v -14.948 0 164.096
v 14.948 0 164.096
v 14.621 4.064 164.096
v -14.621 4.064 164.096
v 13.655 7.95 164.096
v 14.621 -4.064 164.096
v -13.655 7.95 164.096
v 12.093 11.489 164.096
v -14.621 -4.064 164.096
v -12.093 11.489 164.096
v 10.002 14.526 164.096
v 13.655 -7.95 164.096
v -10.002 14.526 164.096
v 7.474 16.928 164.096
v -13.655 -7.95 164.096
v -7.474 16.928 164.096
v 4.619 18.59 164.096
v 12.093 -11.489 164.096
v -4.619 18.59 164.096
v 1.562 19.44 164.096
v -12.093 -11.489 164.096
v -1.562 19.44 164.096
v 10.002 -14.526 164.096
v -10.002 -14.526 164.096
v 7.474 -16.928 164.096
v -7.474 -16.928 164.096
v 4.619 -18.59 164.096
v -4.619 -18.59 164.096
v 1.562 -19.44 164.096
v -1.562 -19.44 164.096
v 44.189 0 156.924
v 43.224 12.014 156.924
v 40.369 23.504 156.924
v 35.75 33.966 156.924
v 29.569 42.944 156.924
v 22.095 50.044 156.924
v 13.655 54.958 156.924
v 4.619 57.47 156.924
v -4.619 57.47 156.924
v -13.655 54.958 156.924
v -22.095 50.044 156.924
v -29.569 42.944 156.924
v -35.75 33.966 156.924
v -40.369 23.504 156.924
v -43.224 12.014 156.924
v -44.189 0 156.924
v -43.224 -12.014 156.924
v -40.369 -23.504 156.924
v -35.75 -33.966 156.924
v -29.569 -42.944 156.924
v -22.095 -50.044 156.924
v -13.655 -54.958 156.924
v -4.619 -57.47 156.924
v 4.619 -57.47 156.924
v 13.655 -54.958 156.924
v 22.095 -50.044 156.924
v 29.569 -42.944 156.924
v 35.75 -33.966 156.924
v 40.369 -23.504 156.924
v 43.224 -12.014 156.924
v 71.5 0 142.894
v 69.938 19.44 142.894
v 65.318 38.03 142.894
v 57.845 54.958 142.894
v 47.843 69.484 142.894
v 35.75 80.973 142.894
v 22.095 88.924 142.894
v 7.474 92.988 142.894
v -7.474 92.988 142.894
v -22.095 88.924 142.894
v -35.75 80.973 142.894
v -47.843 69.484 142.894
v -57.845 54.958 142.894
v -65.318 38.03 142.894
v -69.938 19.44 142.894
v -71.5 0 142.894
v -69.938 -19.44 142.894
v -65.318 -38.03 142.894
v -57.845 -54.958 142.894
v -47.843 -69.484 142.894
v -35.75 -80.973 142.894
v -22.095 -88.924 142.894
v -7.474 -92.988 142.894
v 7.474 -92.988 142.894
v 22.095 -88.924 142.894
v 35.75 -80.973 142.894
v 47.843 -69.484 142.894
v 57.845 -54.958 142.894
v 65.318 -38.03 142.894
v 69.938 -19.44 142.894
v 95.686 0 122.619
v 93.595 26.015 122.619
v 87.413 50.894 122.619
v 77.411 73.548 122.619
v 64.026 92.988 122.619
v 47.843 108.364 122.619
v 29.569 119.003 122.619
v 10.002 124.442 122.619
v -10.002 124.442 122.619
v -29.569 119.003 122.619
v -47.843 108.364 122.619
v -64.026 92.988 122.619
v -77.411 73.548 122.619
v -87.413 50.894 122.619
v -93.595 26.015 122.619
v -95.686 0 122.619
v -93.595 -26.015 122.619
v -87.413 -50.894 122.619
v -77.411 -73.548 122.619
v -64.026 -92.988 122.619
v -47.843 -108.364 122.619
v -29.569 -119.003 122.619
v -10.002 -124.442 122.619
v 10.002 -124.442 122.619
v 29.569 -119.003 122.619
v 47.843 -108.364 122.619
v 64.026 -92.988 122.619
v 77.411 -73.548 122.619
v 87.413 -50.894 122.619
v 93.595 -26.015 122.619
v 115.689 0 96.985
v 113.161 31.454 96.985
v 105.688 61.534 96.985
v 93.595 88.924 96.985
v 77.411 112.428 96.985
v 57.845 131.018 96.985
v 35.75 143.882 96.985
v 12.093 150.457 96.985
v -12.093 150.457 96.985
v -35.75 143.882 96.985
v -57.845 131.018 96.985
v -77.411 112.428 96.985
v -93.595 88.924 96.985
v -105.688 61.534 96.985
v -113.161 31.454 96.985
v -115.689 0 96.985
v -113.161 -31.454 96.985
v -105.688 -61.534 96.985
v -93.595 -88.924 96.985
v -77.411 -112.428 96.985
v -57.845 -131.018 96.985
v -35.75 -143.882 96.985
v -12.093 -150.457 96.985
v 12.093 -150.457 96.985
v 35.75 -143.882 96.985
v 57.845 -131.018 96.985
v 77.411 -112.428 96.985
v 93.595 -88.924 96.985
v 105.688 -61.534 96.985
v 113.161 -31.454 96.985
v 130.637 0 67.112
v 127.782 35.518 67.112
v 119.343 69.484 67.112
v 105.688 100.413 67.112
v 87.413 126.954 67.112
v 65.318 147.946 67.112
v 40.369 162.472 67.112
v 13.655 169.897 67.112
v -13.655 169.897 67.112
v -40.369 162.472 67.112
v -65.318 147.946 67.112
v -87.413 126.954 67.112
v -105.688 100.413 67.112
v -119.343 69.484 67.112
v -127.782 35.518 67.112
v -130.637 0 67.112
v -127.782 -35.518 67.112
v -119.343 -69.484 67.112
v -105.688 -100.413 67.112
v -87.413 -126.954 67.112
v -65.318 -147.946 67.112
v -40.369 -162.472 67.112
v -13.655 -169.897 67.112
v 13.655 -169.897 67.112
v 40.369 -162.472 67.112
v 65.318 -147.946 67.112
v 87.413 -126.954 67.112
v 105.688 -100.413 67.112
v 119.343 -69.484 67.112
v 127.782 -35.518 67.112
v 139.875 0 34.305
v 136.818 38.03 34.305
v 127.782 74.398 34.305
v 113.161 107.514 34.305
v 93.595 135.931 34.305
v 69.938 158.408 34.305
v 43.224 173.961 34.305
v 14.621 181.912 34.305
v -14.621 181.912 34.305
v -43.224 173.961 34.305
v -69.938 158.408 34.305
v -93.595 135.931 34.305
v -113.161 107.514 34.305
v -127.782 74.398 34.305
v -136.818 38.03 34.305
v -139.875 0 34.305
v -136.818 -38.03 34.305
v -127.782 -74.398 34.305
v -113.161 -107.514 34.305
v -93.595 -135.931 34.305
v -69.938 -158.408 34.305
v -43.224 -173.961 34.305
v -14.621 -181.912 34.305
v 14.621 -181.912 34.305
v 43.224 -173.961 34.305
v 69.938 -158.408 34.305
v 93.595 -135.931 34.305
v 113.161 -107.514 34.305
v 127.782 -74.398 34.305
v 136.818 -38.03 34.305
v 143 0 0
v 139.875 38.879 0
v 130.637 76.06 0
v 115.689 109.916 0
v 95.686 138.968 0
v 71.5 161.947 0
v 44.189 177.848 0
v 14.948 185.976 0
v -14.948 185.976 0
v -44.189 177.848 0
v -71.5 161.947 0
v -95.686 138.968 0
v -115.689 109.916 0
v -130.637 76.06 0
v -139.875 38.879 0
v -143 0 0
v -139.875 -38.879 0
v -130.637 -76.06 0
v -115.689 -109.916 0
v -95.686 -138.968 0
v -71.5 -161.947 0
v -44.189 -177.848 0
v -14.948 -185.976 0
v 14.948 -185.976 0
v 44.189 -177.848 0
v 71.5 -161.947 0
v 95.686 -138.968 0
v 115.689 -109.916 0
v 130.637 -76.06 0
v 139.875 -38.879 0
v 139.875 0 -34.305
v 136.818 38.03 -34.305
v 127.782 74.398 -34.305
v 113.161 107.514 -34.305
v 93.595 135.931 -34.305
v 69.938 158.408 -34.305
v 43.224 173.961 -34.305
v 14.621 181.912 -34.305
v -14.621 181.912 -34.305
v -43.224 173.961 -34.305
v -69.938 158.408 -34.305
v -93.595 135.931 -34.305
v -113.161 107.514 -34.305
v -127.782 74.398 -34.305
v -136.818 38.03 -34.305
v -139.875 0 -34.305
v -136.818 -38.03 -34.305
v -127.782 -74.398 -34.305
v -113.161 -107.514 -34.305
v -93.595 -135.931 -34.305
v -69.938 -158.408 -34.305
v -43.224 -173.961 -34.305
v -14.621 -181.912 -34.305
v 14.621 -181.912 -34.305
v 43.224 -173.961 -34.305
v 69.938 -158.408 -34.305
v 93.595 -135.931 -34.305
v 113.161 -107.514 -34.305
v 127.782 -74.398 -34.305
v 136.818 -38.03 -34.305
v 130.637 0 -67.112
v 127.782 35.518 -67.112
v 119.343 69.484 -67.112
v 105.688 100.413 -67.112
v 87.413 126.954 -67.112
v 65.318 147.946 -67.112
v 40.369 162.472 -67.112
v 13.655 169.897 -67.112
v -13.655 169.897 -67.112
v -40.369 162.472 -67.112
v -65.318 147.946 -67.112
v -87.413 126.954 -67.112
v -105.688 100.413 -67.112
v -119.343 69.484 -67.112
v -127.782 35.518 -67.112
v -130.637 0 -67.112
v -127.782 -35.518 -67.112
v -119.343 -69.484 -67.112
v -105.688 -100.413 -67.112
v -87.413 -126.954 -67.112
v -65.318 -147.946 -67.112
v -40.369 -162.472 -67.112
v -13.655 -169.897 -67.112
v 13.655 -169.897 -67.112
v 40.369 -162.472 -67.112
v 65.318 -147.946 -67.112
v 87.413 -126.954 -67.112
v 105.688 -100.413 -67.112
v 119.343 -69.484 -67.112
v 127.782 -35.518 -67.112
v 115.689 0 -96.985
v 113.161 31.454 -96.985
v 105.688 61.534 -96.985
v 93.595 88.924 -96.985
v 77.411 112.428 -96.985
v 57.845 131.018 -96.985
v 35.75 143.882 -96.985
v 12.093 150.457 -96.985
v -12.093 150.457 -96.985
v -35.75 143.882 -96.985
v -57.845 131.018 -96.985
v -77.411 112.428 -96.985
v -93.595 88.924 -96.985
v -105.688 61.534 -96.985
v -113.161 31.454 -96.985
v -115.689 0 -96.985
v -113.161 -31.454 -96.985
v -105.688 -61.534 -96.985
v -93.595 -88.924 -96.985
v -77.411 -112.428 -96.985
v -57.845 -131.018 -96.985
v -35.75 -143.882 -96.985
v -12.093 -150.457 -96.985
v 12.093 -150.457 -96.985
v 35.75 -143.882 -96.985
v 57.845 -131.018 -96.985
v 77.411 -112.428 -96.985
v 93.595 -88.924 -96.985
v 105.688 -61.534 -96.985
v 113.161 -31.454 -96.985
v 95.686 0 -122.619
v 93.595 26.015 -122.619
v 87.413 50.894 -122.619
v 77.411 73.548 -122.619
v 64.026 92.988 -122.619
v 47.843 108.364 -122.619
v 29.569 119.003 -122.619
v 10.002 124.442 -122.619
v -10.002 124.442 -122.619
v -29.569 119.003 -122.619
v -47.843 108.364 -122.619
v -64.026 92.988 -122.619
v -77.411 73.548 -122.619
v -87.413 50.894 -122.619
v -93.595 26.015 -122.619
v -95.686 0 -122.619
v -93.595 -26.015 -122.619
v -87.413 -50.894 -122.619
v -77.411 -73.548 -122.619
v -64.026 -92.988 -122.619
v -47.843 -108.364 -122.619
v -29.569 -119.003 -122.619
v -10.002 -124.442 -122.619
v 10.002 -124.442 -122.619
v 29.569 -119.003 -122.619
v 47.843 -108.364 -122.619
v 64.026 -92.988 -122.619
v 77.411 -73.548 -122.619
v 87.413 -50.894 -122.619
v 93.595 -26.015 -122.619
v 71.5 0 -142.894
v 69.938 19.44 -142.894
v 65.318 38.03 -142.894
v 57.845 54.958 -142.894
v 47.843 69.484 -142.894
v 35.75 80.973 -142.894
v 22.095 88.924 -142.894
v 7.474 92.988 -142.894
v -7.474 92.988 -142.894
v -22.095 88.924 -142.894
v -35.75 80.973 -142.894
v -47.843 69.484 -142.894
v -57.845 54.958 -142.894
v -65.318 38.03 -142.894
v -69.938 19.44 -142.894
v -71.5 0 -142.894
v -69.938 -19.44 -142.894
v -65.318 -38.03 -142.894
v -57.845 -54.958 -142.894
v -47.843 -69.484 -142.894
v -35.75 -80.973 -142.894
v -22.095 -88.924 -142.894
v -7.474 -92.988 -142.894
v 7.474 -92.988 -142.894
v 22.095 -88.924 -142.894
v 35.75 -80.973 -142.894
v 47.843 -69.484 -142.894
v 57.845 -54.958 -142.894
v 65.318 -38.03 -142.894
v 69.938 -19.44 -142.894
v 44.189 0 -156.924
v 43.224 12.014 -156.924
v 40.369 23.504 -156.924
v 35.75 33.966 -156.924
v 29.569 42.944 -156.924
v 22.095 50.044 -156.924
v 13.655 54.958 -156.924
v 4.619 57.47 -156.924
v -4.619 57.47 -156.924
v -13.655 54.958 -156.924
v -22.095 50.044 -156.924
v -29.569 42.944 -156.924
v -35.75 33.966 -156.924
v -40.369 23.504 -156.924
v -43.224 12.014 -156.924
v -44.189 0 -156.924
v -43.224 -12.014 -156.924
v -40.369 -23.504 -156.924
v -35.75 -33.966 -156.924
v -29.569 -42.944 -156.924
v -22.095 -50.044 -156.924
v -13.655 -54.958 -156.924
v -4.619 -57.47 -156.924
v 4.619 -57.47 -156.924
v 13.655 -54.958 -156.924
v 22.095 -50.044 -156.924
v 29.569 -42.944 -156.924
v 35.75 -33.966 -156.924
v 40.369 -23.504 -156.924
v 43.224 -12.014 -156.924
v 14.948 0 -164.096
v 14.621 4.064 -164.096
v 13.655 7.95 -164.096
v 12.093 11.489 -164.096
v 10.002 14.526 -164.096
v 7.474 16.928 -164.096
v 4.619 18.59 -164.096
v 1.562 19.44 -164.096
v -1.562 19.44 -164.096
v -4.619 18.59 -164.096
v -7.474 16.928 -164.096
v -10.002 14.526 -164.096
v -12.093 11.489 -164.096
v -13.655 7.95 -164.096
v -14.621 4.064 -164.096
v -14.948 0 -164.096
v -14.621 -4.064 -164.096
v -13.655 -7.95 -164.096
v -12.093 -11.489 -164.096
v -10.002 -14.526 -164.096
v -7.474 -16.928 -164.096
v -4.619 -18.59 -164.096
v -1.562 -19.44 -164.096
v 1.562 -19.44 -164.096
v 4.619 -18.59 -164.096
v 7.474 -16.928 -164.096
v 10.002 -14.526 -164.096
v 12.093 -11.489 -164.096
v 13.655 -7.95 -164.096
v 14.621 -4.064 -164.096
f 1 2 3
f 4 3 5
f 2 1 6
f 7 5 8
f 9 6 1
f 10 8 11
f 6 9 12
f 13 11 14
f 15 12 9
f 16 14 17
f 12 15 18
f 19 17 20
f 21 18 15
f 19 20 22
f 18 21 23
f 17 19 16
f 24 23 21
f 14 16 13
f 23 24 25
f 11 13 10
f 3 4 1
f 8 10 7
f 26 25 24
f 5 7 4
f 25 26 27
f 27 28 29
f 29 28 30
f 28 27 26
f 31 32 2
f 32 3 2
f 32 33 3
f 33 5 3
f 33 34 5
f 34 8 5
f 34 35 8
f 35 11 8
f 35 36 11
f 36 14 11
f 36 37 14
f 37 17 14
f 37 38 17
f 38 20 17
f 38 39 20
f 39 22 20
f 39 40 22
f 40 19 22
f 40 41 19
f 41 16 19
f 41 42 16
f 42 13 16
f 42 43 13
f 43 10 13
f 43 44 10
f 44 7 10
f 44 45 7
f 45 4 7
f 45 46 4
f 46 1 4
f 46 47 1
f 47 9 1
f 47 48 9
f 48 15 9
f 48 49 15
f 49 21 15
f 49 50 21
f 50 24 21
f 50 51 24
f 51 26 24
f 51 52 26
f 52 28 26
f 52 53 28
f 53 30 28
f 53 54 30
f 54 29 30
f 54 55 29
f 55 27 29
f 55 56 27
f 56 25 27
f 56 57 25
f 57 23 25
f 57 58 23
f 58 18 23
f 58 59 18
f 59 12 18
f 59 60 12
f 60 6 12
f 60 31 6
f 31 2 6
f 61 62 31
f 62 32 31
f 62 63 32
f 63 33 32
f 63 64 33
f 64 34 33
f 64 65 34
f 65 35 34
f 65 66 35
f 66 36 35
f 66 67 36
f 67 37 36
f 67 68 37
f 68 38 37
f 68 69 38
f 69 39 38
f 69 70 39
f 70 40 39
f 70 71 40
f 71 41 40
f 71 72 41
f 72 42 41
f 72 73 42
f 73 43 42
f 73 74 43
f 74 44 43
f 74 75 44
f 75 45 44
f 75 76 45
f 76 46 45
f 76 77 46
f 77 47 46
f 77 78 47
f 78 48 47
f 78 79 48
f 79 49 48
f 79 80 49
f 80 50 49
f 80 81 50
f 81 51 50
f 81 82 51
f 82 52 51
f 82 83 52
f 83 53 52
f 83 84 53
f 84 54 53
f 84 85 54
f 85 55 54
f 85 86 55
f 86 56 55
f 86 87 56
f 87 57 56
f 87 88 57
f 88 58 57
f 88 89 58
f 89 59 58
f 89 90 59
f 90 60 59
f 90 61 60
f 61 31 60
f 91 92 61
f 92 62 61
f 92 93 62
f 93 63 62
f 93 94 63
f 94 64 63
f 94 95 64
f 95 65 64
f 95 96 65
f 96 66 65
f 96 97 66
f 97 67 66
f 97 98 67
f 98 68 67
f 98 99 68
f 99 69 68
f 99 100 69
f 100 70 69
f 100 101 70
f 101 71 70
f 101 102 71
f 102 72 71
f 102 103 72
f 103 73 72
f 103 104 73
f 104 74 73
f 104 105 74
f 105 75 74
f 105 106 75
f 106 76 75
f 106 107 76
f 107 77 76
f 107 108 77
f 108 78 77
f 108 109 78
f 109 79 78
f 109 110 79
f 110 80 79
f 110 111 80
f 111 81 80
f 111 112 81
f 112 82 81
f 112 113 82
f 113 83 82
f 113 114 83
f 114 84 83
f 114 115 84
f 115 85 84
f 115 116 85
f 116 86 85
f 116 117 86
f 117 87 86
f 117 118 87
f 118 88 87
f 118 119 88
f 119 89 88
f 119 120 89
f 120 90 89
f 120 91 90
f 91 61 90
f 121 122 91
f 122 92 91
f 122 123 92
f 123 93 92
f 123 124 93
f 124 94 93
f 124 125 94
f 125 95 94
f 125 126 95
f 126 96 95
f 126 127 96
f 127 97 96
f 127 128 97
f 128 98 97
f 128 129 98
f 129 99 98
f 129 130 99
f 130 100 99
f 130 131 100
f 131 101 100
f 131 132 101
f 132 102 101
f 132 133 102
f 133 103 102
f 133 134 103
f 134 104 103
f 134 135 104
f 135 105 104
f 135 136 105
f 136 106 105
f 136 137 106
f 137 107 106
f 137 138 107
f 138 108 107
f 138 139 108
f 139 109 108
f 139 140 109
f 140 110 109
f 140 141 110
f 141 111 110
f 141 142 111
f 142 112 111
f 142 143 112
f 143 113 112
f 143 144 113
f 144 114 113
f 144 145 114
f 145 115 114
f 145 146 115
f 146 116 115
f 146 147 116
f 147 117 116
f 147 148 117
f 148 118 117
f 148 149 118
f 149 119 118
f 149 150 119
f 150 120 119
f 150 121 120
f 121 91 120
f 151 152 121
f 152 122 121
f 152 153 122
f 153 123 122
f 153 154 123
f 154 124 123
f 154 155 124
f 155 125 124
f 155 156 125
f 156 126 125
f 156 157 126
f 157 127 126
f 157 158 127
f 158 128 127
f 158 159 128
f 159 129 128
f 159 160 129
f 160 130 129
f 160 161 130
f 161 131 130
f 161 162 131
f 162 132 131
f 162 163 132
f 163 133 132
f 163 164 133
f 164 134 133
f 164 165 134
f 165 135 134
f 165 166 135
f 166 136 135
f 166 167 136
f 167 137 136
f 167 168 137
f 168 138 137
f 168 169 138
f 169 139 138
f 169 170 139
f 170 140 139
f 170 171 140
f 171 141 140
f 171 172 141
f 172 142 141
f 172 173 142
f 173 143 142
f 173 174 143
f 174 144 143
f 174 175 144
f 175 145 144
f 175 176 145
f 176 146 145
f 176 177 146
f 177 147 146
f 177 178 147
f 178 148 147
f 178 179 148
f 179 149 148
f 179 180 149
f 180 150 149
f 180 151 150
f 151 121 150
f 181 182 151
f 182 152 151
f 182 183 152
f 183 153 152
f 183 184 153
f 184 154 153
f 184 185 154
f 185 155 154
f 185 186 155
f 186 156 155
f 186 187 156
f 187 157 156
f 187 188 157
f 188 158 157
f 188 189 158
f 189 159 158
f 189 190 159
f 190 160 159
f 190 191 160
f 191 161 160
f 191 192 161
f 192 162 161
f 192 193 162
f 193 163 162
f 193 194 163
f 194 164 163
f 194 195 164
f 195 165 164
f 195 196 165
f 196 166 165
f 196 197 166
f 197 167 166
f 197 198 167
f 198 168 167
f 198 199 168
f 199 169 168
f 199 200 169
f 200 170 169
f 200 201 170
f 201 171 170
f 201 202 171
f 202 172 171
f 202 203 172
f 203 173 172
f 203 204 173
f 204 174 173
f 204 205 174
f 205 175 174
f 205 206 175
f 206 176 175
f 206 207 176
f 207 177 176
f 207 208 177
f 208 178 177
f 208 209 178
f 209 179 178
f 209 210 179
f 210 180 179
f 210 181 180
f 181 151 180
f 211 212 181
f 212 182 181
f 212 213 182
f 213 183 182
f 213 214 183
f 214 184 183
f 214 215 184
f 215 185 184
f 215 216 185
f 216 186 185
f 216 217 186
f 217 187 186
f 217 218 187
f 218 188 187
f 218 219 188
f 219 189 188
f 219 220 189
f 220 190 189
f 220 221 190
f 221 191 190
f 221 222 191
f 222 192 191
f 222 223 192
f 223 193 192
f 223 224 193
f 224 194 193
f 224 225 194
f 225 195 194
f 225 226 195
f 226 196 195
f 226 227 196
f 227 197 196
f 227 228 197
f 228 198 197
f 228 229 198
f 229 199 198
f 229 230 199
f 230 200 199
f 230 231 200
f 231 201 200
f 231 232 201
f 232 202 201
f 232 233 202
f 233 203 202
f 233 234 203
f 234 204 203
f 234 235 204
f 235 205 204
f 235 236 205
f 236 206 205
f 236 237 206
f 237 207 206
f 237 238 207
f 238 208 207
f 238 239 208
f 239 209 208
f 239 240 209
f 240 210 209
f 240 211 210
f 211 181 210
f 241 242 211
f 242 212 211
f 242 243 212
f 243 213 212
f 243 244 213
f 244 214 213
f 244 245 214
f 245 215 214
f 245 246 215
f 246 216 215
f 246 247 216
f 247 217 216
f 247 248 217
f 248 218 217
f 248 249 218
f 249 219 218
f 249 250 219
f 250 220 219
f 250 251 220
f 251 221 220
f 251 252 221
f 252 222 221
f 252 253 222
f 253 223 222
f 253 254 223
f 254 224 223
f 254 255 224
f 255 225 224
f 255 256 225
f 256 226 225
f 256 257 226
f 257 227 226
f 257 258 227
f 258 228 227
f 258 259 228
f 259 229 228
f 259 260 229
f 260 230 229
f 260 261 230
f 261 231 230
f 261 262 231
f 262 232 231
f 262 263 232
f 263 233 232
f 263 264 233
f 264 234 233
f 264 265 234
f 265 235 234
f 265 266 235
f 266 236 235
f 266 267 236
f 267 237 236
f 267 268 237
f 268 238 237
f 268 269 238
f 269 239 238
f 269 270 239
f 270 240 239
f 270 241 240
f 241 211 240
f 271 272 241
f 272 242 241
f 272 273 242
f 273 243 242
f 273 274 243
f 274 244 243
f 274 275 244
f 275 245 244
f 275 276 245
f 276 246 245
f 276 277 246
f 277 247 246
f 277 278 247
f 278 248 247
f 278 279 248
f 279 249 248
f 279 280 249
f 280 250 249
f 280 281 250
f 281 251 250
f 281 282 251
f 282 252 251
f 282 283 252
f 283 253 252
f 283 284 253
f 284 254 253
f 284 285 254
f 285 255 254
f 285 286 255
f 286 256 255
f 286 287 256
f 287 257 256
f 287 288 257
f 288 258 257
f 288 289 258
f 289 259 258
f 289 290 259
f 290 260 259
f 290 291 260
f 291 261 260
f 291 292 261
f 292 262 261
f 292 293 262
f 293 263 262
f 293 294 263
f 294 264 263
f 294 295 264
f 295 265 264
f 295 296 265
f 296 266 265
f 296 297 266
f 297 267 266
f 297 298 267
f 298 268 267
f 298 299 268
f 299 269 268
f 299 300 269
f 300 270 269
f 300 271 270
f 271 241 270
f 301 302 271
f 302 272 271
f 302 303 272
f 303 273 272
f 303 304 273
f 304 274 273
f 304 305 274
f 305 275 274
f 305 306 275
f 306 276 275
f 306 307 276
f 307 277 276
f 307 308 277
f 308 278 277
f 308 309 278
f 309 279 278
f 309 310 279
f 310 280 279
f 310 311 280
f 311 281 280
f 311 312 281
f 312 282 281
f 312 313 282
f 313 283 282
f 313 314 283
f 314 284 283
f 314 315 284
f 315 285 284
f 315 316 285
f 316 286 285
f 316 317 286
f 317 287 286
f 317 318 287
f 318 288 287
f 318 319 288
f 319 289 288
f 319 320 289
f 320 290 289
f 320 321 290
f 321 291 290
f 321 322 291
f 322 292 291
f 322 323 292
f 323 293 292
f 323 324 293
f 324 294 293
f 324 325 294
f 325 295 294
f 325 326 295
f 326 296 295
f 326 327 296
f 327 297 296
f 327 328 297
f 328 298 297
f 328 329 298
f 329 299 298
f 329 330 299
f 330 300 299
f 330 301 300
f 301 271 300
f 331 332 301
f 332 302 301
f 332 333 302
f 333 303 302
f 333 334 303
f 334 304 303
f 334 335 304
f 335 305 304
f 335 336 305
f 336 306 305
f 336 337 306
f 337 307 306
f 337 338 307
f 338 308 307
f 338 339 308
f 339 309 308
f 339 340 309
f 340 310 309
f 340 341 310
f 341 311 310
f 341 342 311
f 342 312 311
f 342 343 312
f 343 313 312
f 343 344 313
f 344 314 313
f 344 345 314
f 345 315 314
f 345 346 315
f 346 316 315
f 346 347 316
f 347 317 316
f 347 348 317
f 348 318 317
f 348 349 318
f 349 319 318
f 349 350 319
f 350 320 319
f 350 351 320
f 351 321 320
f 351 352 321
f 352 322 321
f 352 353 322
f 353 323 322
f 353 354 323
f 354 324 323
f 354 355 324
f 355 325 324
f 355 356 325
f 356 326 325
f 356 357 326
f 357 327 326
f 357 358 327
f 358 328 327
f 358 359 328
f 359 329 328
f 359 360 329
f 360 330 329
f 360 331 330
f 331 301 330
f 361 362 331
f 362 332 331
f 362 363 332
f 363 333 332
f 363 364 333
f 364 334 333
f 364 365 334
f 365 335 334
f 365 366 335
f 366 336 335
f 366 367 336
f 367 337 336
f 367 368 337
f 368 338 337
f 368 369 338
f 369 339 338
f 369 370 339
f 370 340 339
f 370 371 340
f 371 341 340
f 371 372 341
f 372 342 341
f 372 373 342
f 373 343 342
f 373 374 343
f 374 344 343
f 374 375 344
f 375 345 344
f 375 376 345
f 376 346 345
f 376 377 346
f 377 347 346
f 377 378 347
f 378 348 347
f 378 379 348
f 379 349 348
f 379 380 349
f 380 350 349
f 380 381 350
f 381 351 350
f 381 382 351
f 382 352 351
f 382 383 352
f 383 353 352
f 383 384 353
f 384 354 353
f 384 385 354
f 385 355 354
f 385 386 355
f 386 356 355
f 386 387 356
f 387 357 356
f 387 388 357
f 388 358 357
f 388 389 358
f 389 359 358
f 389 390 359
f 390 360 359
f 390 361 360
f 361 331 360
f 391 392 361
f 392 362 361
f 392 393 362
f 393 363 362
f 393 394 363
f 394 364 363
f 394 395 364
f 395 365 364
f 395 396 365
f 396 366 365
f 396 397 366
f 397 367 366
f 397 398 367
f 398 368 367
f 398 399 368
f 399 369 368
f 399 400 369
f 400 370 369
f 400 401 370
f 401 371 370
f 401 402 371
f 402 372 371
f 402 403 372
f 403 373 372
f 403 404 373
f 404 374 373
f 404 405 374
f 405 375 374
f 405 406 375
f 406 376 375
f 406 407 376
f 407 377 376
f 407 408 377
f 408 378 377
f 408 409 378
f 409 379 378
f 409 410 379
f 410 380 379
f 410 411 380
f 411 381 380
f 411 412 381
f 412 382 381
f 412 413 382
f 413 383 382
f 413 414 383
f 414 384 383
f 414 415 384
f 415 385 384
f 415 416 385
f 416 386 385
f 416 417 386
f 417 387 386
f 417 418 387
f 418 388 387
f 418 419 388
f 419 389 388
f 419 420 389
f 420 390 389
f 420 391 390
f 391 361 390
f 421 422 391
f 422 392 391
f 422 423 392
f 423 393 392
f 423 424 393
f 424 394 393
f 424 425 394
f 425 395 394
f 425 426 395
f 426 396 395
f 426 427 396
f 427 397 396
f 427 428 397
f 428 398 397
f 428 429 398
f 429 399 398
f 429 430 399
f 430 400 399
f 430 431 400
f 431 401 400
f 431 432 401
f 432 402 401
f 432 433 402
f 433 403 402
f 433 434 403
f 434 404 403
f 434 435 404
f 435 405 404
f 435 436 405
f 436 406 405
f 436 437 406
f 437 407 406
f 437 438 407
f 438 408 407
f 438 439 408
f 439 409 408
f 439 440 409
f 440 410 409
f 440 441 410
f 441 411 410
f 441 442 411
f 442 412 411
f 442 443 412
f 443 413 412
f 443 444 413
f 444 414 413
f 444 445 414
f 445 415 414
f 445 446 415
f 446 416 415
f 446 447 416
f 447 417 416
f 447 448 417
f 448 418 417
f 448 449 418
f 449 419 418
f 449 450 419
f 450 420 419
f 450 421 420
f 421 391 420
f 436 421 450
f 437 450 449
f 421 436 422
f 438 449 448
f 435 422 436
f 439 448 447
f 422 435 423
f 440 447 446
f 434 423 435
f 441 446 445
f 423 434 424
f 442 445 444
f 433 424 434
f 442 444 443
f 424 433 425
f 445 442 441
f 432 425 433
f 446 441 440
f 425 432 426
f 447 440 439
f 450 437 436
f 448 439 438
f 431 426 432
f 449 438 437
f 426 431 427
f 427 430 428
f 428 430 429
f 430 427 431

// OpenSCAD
// Generated by SolidPython 1.0.1 on 2020-07-29 00:46:51


scale(v = [13, 17, 15]) {
	sphere(r = 11);
}
/***********************************************
*********      SolidPython code:      **********
************************************************
 
# import packages: SolidPython
from solid import *
from solid.utils import *
from itertools import chain, combinations, permutations


class Resize:

    def __init__(self, scad_file):
        self.scad_file = scad_file
        #self.scad_file = import_scad(scad_file)
        # cone/cylinder param:
        self.r1 = 0
        self.r2 = 0
        self.h = 0
        # rectangular prism param:
        self.w = 0
        self.l = 0
        # ellipse param:
        self.r = 0

    # import OpenScad code (file name corresponds to shape)


    # classify shape + parameters
    def assign(self, param1, param2, param3):
        if self.scad_file == 'cone.scad':
            self.r1 = param1
            self.r2 = param2
            self.h = param3
        elif self.scad_file == 'cylinder.scad':
            self.r1 = param1
            self.r2 = param2
            self.h = param3
        elif self.scad_file == 'rectangularPrism.scad':
            self.h = param1
            self.l = param2
            self.w = param3
        else:
            self.r = param1
            self.h = param2

    # resize parameters
    def iterate(self):
        x = range(3, 20, 2)
        i = 1
        if self.scad_file == 'cone.scad':
            tempList = list(permutations(x, 2))
            for temp in tempList:
                param1 = temp[0]
                param2 = temp[1]
                filepath = 'produced_scad_files/' + 'cone' + str(param1) + '_' + str(param2) + '_' + '.scad'
                scad_render_to_file(cylinder(h=param1, r1=param2, r2=0), filepath)

        elif self.scad_file == 'cylinder.scad':
            tempList = list(permutations(x, 3))
            for temp in tempList:
                param1 = temp[0]
                param2 = temp[1]
                filepath = 'produced_scad_files/' + 'cylinder' + str(param1) + '_' + str(param2) + '_' + '.scad'
                scad_render_to_file(cylinder(h=param1, r1=param2, r2=param2), filepath)

        elif self.scad_file == 'rectangularPrism.scad':
            tempList = list(permutations(x, 3))
            for temp in tempList:
                param1 = temp[0]
                param2 = temp[1]
                param3 = temp[2]
                filepath = 'produced_scad_files/' + 'rectangularPrism' + str(param1) + '_' + str(param2) + '_' + str(
                    param3) + '.scad'
                scad_render_to_file(cube(size=(param1, param2, param3)), filepath)

        elif self.scad_file == 'ellipse.scad':
            tempList = list(permutations(x, 4))
            for temp in tempList:
                param1 = temp[0]
                param2 = temp[1]
                param3 = temp[2]
                param4 = temp[3]
                filepath = 'produced_scad_files/' + 'ellipse' + str(param1) + '_' + str(param2) + '_' + str(param3) + '_' + str(param4) + '.scad'
                scad_render_to_file(scale([param1, param2, param3])(sphere(r=param4)), filepath)

    def render_to_scadfile(self):
        scad_render_to_file(scad, 'example.scad') 
 
************************************************/
